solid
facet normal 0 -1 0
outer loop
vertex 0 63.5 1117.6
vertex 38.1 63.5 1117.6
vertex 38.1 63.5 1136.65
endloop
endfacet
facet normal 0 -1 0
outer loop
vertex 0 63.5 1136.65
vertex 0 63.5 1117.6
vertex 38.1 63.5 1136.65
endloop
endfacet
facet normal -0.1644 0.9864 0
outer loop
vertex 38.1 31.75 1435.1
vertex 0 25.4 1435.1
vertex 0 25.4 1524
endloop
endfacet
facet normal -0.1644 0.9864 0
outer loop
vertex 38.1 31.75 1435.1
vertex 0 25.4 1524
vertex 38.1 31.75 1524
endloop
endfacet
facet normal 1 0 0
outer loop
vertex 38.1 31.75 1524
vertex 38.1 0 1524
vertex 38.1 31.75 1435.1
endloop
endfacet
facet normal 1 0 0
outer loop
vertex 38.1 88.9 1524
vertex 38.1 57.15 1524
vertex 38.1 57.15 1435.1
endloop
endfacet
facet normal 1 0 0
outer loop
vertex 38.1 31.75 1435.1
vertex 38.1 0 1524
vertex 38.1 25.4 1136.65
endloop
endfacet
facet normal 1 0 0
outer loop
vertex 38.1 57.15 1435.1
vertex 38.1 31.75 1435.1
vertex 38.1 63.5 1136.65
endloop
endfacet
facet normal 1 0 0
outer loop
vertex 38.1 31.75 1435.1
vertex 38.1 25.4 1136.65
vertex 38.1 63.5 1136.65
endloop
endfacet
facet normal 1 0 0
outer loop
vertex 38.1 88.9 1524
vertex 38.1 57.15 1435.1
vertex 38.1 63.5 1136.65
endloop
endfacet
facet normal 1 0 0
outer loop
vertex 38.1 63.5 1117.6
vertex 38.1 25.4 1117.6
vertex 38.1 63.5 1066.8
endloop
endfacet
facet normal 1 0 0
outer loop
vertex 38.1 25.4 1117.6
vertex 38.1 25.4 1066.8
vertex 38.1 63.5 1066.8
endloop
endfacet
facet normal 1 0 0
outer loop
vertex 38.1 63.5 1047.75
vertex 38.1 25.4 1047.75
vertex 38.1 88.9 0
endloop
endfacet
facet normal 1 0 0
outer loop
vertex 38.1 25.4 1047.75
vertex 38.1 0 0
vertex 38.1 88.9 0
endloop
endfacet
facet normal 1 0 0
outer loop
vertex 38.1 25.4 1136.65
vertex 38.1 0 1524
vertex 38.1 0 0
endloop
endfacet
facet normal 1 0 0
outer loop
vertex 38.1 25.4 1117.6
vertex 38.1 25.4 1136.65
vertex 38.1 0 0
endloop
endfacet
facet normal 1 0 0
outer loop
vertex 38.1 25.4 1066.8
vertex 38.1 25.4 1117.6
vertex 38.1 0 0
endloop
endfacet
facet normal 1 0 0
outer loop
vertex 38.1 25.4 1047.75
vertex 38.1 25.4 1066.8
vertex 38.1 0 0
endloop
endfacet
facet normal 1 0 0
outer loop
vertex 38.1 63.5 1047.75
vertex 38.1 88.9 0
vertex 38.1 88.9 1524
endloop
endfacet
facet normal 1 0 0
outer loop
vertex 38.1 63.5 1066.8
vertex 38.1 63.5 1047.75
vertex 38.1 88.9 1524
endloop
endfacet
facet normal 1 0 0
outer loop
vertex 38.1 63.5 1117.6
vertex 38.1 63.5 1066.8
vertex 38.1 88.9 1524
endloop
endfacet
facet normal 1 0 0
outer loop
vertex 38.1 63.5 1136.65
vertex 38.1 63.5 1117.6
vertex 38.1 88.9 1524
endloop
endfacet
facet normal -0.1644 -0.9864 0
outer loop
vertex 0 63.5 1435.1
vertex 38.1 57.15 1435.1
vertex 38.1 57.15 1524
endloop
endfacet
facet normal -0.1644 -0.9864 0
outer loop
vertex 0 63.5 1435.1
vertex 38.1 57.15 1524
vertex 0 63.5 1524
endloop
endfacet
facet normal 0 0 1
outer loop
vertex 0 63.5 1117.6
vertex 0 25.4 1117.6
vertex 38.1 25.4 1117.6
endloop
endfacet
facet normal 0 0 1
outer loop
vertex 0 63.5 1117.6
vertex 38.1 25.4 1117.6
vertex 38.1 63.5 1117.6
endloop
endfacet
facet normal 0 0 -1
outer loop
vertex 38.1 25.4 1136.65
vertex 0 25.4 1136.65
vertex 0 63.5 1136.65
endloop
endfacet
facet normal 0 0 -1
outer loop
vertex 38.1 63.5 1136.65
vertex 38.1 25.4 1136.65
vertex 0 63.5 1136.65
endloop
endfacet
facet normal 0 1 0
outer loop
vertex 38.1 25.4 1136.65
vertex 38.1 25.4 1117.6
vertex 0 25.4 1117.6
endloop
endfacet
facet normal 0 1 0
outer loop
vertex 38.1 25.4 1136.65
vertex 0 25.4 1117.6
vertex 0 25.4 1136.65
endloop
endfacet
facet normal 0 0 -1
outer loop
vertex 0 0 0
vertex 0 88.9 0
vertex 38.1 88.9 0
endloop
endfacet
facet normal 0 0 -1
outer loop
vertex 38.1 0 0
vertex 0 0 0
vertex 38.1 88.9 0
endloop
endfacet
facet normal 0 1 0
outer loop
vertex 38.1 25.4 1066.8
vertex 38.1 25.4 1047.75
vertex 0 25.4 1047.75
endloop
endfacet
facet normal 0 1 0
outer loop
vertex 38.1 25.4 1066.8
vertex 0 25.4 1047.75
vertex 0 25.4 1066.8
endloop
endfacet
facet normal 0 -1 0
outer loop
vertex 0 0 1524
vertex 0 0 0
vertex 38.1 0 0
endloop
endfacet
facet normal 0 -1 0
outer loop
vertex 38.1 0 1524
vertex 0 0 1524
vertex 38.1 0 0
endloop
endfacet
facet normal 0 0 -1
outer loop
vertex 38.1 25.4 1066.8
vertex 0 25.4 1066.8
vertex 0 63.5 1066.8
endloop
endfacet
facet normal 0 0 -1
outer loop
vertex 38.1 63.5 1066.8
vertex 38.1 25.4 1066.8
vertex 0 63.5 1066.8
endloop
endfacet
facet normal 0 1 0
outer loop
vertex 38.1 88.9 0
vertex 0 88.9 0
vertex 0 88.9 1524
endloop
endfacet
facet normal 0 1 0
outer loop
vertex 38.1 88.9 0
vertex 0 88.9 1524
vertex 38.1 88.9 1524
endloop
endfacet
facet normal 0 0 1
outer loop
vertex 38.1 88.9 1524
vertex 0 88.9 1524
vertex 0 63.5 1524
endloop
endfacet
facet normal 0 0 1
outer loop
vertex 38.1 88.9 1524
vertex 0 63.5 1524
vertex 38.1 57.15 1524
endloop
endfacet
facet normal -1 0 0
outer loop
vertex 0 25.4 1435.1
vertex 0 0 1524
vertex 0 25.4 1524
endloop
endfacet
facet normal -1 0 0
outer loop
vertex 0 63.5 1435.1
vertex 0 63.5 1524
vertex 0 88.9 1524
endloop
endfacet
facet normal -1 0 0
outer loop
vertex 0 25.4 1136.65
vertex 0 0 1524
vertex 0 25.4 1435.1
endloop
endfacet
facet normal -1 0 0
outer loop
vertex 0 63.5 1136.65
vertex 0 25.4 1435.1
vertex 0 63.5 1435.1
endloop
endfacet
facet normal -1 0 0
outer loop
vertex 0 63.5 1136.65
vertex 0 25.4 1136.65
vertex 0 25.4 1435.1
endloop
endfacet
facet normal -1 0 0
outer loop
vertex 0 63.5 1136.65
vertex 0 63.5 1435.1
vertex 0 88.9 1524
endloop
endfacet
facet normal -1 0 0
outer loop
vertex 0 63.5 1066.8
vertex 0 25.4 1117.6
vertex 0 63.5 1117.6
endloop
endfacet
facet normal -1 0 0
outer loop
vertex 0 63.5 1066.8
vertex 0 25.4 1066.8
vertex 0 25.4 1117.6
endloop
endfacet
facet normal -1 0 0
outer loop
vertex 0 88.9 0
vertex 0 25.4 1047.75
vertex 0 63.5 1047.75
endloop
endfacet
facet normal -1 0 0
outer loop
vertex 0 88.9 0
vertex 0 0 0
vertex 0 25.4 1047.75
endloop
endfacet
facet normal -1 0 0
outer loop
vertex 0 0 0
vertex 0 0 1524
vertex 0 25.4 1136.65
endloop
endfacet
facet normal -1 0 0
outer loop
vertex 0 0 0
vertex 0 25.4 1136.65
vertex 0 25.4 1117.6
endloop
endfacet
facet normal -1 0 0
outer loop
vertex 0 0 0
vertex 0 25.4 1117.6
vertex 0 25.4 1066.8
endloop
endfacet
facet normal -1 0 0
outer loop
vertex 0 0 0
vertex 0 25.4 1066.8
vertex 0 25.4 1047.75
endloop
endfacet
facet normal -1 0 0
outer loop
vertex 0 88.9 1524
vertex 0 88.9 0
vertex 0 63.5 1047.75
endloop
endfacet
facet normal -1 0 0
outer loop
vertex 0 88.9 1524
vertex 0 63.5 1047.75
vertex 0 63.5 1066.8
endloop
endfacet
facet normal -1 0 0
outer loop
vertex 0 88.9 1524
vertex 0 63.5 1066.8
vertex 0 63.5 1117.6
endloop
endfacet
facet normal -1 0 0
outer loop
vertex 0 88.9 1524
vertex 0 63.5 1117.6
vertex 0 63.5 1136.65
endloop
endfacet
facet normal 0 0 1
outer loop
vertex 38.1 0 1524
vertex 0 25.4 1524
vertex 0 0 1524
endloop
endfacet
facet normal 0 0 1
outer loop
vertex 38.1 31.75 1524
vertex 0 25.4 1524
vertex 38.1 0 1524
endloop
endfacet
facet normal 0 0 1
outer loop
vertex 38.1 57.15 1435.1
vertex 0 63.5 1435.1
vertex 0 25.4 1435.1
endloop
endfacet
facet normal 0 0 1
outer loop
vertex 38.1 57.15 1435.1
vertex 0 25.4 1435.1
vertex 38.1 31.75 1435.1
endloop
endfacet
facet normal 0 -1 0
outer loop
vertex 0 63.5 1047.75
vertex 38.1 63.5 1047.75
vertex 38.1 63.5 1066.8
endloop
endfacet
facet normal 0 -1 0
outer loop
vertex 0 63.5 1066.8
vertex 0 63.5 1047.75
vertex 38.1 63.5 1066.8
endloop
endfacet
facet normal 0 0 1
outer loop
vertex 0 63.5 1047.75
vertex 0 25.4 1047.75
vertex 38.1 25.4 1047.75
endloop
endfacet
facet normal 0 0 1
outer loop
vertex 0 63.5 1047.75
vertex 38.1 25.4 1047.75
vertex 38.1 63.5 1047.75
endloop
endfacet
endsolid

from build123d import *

# Parameters (mm, degrees)
F0_W     = 38.1
F0_H     = 88.9
F1_DEPTH = 1524
F2_W     = 38.1
F2_H     = 19.05
F3_DEPTH = 38.1
F5_DEPTH = 88.9


with BuildPart() as f1:
    # F0 (on Top) → F1 (new body)
    with BuildSketch(Plane.XY):
        with Locations((19.05, 44.45)):
            Rectangle(F0_W, F0_H)
    extrude(amount=F1_DEPTH)

    # F2 (on face) → F3 (cut, through all)
    with BuildSketch(Plane.YZ.offset(38.1)):
        with Locations((44.45, 1127.125)):
            Rectangle(F2_W, F2_H)
        with Locations((44.45, 1057.275)):
            Rectangle(F2_W, F2_H)
    extrude(amount=-F3_DEPTH, mode=Mode.SUBTRACT)

    # F4 (on face) → F5 (cut)
    with BuildSketch(Plane.XY.offset(1524)):
        Polygon((0, 63.5), (0, 25.4), (38.1, 31.75), (38.1, 57.15), align=None)
    extrude(amount=-F5_DEPTH, mode=Mode.SUBTRACT)


solid = f1.part
